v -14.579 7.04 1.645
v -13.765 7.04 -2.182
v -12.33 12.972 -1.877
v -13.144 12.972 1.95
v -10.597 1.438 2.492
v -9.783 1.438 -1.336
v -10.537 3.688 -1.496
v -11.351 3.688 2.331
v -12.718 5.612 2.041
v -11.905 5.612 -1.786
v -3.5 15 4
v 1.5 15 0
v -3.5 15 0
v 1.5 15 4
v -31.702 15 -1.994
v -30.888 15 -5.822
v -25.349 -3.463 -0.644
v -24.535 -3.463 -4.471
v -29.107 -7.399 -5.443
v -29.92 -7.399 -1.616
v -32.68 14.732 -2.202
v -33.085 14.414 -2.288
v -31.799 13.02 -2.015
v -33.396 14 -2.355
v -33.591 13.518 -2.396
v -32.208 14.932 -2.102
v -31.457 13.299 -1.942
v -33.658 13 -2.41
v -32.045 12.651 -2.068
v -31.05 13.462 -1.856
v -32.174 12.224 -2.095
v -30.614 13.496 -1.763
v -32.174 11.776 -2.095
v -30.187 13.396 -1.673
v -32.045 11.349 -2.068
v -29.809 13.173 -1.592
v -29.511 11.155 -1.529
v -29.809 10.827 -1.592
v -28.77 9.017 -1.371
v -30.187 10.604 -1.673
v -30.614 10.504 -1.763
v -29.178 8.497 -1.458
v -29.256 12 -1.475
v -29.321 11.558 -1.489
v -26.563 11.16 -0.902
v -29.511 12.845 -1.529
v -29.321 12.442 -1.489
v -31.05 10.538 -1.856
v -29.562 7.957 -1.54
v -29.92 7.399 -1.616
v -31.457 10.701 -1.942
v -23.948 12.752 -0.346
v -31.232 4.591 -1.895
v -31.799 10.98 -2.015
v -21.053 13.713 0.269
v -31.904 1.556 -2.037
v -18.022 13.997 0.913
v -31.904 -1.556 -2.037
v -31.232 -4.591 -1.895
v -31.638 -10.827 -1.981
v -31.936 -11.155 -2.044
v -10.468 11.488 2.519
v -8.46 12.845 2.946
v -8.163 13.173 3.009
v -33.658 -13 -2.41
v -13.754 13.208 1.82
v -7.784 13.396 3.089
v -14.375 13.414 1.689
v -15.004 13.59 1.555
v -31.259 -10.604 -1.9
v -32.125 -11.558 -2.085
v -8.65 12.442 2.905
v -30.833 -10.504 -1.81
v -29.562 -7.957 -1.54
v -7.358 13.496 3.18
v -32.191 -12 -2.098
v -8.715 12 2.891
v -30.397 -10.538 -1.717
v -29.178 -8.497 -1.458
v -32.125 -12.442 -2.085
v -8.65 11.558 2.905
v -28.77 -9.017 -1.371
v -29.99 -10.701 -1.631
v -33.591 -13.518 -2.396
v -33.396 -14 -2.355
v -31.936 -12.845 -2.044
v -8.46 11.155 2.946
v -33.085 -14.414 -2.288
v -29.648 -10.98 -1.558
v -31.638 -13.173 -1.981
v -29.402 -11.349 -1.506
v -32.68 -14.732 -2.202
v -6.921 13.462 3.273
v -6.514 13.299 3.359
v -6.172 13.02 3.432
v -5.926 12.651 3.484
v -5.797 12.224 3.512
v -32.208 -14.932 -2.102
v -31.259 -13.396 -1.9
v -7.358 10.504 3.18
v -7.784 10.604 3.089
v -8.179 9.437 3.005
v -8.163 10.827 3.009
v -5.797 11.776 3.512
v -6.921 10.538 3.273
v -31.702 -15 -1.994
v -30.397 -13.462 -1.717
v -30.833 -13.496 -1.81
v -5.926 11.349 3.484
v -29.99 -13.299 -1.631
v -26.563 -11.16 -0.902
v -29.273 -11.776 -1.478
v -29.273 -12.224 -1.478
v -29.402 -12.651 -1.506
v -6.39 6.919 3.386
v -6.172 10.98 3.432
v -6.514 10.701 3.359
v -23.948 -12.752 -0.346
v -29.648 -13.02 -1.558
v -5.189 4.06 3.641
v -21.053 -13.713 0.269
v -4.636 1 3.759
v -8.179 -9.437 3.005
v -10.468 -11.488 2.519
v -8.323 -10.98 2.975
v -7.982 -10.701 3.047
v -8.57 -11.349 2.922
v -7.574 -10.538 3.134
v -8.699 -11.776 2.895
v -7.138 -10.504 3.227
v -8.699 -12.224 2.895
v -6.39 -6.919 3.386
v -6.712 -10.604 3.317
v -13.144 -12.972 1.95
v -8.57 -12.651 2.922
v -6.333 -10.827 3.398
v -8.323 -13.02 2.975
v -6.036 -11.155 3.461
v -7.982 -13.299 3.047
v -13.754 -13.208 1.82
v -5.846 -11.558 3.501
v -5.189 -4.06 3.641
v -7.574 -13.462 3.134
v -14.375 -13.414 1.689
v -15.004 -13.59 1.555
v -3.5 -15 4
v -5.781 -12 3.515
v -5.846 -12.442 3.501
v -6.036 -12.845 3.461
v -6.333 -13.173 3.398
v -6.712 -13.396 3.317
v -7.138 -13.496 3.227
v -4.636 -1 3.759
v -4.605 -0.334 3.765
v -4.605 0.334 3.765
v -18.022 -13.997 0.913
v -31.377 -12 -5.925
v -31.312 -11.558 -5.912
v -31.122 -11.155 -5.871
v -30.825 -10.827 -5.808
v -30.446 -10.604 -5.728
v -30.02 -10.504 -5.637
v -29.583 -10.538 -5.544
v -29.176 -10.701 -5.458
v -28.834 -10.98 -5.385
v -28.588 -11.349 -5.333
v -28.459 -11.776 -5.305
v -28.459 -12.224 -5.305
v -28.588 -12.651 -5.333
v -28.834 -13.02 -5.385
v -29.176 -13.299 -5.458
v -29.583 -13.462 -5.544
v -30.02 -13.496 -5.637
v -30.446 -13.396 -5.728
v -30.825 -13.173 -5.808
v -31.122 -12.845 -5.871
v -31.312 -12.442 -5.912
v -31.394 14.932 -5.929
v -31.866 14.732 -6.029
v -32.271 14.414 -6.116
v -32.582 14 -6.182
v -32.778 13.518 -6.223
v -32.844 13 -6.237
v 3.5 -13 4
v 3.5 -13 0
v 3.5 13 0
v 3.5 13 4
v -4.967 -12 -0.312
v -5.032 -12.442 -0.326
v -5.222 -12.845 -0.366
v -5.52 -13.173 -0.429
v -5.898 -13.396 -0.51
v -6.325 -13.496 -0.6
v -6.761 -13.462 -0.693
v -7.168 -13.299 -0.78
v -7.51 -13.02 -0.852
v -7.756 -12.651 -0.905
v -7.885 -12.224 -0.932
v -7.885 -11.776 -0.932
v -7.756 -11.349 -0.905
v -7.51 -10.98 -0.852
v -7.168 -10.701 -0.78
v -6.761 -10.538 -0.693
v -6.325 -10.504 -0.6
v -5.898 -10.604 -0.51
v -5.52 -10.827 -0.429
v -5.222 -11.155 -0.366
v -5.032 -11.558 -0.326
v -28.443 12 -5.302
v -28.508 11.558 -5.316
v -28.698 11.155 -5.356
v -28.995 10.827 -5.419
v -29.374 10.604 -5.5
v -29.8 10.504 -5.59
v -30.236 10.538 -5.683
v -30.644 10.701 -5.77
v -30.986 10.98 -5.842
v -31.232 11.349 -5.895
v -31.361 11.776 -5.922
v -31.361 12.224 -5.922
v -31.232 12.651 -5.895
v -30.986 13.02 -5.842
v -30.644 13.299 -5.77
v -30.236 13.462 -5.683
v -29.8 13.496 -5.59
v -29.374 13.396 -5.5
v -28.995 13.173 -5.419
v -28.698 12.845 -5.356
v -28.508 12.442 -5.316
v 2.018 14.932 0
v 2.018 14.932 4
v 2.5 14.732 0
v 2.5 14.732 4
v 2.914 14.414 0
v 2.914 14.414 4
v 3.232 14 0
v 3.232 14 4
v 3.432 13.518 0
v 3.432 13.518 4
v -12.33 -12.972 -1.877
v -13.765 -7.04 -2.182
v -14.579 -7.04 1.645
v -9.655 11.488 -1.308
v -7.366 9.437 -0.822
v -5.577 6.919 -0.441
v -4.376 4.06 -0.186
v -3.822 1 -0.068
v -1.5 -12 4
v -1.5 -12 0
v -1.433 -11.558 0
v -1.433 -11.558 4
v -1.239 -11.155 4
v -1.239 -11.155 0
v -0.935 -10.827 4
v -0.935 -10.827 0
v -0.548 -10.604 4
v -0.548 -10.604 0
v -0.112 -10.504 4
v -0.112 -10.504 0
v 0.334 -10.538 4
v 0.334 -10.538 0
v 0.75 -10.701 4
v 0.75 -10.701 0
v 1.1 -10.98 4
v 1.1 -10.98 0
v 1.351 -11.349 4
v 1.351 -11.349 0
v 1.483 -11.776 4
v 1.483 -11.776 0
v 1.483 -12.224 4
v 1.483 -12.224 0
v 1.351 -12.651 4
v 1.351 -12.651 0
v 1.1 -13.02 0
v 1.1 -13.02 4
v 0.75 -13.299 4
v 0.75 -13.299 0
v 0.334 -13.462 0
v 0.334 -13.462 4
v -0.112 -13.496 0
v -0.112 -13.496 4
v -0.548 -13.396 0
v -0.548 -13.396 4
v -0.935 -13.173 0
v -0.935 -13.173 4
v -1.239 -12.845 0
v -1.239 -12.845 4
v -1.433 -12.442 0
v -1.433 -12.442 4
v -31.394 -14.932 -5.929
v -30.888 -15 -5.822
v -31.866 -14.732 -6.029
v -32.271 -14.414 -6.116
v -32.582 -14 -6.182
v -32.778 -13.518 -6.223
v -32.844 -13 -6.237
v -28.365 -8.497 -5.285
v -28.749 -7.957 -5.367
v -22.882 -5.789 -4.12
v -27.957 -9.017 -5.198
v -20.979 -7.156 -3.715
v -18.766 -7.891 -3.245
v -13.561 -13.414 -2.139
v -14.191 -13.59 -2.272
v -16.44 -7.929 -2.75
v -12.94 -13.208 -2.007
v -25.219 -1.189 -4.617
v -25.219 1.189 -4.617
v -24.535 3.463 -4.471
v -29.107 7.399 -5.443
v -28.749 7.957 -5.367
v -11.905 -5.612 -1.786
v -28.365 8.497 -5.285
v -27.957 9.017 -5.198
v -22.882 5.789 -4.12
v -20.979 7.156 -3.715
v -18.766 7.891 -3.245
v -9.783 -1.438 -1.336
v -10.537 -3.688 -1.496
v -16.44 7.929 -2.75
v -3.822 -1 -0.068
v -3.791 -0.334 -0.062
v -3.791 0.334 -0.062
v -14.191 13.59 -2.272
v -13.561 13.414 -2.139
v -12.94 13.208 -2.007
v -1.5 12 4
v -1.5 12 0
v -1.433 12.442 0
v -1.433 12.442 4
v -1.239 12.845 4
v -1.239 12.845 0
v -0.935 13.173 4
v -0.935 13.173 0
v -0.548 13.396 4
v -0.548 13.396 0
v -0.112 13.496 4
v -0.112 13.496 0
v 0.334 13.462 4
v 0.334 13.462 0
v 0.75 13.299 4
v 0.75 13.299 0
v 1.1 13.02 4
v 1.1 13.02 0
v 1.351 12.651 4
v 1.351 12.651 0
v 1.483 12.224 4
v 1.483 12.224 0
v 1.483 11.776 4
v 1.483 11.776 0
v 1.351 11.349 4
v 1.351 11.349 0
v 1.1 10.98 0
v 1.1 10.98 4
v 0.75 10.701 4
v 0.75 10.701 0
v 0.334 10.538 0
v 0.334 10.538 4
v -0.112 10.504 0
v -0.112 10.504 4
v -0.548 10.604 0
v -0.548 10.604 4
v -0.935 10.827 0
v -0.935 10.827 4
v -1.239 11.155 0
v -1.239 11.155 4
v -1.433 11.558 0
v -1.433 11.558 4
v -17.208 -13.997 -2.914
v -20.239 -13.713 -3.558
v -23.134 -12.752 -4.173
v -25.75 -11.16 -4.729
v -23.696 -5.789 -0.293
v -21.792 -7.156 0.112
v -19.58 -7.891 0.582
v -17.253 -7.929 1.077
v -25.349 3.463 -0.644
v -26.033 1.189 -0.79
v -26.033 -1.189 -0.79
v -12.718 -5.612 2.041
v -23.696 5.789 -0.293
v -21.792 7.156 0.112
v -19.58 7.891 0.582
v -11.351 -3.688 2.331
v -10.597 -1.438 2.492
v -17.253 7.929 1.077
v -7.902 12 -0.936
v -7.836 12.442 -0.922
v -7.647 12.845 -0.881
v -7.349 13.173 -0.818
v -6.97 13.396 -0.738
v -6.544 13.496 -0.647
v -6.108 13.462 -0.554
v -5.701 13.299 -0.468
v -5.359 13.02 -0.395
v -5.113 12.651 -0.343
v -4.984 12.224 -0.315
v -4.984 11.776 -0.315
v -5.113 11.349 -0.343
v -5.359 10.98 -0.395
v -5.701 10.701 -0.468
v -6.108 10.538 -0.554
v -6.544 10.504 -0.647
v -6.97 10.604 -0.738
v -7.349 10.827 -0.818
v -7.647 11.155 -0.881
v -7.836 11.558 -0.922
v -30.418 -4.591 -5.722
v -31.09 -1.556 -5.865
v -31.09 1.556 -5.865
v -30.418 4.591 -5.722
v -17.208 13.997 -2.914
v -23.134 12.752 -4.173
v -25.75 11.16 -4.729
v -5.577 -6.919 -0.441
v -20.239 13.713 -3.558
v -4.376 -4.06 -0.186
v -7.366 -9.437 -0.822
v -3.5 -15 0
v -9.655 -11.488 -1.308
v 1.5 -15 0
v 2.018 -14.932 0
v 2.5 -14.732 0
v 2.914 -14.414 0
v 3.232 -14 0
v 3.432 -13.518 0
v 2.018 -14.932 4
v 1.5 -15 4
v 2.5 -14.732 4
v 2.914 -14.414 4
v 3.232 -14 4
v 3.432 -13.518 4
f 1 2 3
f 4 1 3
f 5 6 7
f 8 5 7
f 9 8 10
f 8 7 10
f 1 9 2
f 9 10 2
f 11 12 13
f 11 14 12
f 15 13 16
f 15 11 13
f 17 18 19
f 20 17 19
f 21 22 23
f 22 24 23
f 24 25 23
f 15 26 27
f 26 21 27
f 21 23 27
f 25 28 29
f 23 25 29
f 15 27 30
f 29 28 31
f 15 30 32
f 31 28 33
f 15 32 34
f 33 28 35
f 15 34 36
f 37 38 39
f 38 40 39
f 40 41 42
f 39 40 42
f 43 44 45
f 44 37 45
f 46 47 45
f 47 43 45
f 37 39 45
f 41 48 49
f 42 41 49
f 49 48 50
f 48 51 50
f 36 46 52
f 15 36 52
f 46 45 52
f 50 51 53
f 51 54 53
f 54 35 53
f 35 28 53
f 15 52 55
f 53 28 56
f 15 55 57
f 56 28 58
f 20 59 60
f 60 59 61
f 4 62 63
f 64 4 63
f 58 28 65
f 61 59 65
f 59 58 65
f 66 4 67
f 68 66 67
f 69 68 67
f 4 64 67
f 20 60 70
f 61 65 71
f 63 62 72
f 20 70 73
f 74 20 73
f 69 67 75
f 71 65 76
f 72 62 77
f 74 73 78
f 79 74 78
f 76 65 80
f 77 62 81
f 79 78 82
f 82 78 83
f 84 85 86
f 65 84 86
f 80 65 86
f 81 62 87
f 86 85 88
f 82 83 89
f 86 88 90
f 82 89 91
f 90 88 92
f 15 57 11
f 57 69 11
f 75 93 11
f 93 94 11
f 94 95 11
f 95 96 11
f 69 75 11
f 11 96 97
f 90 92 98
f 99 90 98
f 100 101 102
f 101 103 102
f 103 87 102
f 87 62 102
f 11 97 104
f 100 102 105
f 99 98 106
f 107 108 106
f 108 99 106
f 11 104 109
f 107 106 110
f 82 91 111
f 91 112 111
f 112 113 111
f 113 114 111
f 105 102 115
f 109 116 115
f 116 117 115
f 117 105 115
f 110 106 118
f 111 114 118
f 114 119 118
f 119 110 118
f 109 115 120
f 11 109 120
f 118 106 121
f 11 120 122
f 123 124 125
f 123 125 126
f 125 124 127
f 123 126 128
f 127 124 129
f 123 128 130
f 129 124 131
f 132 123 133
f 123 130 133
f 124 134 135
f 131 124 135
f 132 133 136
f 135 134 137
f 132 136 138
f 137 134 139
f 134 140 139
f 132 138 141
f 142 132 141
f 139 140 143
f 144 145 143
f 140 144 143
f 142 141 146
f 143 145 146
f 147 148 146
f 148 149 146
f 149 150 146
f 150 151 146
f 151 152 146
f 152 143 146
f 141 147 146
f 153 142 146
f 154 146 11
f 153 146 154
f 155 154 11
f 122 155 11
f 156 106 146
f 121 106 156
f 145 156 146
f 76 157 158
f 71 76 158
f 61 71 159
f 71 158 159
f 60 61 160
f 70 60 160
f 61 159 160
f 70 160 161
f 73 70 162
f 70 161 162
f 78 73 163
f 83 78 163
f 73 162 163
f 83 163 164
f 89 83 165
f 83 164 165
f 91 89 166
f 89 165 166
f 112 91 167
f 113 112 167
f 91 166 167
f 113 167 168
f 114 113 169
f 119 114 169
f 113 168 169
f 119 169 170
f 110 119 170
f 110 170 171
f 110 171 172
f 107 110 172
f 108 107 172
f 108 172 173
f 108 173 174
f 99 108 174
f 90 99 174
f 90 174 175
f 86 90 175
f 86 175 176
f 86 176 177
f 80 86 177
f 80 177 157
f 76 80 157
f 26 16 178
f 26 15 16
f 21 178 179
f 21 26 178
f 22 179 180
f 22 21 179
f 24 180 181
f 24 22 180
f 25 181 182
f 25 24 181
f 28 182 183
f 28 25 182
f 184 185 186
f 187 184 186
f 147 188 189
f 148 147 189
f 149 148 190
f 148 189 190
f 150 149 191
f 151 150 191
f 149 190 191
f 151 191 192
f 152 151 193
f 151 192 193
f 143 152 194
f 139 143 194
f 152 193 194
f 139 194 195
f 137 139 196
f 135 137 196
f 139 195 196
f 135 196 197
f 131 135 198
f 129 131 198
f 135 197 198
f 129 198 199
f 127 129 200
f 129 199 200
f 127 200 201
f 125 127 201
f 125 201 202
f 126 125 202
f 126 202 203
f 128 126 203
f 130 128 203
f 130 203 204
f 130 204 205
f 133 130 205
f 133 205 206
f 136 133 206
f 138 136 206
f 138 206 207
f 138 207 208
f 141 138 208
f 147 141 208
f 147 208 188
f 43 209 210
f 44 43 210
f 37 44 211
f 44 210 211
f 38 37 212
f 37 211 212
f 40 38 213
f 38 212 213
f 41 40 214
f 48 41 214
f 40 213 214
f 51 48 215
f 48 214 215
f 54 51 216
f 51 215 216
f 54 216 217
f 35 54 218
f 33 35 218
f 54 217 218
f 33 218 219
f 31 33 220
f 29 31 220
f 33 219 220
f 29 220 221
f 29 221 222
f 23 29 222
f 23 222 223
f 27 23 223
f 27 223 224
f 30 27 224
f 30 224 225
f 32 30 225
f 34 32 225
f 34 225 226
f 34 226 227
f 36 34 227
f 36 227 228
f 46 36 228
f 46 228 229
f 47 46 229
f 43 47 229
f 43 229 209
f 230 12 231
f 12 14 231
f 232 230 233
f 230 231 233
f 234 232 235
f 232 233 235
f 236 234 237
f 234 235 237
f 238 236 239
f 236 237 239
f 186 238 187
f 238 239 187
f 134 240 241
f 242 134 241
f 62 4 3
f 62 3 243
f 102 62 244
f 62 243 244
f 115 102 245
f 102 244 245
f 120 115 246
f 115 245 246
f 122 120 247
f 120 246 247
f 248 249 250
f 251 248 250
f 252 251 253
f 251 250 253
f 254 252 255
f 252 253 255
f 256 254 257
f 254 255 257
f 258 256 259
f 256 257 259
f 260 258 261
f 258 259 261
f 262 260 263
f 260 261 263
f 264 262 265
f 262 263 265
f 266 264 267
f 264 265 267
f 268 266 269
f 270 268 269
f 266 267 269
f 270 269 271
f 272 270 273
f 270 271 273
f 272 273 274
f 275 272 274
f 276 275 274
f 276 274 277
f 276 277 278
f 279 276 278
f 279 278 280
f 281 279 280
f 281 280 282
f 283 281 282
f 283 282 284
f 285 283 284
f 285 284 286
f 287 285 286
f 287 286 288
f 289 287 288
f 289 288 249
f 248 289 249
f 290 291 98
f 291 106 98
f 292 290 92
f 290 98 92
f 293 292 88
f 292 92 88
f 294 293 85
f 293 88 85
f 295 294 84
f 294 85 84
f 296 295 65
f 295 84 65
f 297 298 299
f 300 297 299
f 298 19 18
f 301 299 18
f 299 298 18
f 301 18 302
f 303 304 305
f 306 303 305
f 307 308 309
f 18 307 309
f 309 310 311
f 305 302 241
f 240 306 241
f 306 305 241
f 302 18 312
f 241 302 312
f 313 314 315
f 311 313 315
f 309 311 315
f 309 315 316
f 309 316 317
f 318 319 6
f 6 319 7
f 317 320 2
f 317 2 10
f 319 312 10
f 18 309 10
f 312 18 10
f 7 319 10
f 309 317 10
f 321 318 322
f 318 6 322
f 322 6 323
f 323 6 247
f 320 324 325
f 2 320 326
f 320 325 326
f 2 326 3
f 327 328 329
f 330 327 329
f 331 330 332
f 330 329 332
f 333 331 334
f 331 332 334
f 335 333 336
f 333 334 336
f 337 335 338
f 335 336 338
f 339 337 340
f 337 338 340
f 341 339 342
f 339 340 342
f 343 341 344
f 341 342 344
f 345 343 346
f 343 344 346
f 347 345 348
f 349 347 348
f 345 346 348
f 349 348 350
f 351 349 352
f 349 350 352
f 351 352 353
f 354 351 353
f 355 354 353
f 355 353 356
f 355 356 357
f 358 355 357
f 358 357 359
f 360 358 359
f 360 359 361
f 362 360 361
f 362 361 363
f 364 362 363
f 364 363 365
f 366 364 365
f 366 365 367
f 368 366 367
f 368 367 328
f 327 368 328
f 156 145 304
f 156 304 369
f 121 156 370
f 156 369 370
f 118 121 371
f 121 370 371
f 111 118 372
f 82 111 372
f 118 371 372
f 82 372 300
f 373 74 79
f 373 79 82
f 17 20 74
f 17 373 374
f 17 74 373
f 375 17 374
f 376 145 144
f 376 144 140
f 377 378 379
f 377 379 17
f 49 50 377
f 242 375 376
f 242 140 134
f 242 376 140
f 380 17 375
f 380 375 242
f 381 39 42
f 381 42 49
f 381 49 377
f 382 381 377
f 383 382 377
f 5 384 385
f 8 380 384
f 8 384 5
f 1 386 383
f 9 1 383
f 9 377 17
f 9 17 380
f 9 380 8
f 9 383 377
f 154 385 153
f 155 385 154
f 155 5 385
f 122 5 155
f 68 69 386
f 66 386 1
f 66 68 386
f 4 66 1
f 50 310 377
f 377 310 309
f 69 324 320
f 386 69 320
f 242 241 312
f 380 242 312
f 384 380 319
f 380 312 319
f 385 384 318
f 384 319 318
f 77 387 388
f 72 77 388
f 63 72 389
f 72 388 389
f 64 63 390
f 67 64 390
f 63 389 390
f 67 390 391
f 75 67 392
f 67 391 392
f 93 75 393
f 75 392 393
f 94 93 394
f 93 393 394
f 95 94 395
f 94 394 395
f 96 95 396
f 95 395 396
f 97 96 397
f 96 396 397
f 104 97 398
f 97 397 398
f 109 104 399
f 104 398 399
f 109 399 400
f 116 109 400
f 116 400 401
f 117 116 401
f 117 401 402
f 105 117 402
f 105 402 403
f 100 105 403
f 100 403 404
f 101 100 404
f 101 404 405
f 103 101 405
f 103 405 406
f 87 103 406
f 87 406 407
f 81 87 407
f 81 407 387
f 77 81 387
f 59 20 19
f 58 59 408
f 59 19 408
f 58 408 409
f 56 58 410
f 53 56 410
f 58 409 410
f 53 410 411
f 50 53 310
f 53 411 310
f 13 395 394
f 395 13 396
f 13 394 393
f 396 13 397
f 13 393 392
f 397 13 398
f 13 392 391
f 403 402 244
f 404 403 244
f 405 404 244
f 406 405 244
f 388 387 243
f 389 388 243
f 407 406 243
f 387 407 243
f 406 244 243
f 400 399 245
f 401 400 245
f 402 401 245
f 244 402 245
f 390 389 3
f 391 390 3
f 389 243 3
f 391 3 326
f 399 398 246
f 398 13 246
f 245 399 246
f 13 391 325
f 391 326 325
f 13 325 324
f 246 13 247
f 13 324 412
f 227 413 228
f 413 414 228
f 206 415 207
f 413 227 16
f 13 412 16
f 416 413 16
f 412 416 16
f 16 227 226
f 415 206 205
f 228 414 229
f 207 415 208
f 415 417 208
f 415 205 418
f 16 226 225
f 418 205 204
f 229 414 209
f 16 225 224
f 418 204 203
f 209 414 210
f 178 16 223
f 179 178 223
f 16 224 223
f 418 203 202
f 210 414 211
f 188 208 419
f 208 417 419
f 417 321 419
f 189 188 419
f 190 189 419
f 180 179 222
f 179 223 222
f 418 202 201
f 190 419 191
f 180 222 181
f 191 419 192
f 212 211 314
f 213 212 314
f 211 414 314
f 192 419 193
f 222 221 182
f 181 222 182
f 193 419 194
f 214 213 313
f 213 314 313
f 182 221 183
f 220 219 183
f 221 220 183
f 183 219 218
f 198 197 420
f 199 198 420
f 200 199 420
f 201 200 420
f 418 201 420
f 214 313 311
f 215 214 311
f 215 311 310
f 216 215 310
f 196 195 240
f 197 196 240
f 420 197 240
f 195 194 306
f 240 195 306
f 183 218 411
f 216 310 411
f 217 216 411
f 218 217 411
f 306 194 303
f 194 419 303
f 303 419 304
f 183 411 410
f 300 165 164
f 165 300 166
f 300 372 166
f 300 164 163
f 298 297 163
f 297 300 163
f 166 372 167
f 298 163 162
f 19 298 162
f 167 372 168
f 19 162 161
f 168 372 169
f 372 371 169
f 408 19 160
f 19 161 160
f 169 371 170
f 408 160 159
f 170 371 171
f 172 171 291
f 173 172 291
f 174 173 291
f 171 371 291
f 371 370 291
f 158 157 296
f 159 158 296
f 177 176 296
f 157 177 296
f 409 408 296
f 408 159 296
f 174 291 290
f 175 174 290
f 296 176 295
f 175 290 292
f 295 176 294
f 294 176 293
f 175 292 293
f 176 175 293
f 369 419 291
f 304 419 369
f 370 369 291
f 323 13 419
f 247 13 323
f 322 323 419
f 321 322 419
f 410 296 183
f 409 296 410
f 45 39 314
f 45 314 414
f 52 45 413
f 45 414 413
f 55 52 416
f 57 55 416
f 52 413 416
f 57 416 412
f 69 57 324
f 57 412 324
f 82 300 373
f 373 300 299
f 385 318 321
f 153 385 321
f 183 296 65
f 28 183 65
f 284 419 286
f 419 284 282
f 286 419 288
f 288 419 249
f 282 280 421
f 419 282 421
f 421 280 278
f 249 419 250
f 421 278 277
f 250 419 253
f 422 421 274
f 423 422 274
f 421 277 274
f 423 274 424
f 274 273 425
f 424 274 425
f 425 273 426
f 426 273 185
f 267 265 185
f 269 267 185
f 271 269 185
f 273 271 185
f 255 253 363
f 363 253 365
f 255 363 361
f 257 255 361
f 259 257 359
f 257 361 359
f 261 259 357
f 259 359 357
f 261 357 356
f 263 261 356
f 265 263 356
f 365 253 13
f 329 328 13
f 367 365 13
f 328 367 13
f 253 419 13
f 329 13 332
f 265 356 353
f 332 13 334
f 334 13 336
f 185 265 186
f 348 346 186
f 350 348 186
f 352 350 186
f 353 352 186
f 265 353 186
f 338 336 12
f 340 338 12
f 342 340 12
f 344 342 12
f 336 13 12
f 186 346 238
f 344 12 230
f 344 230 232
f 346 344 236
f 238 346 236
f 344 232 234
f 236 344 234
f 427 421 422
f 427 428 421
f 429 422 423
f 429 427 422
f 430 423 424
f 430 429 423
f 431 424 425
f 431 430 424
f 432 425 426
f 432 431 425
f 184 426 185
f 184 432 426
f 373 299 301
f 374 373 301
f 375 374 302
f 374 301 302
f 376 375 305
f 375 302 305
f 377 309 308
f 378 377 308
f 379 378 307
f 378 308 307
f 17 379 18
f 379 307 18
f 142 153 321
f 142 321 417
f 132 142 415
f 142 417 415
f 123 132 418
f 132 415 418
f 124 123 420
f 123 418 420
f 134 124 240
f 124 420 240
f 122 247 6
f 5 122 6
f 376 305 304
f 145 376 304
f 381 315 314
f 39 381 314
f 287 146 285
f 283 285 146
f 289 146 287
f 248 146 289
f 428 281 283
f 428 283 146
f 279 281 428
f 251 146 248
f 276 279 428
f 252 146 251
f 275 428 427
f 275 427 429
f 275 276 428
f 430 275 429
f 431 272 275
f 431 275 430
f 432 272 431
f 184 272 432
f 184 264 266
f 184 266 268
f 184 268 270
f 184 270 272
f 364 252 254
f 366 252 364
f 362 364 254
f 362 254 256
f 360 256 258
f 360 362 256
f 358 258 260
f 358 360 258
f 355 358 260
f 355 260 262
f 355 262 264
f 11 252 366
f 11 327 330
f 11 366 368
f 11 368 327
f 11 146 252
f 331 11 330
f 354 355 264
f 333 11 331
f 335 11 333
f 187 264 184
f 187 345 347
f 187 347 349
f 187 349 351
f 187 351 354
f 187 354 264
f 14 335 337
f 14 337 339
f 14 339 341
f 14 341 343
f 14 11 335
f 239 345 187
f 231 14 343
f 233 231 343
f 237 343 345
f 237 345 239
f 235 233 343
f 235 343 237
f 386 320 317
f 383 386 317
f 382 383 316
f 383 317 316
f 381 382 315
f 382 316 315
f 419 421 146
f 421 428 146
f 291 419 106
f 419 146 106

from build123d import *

# Parameters (mm, degrees)
SKETCH_1_W          = 7
SKETCH_1_H          = 30
EXTRUDE_1_DEPTH     = 4
EXTRUDE_2_DEPTH     = 30
SKETCH_3_R          = 1.5
CUT_EXTRUDE_2_DEPTH = 38.373237277
SKETCH_4_R          = 1.5
CUT_EXTRUDE_3_DEPTH = 38.362858307
SKETCH_5_R          = 14
CUT_EXTRUDE_4_DEPTH = 38.362858307
FILLET_1_R          = 2
FILLET_2_R          = 2
EXTRUDE_START       = -3.912590403
EXTRUDE_4_DEPTH     = 3.912590403


with BuildPart() as part:
    # 草圖1 → 填料-伸長1 (new body)
    with BuildSketch(Plane.XY):
        Rectangle(SKETCH_1_W, SKETCH_1_H)
    extrude(amount=EXTRUDE_1_DEPTH)

    # 草圖2 → 填料-伸長2 (add)
    with BuildSketch(Plane.XZ.offset(15)):
        Polygon((-3.5, 0), (-32.844428022, -6.237350725), (-33.657901308, -2.410259809), (-3.5, 4), align=None)
    extrude(amount=-EXTRUDE_2_DEPTH)

    # 草圖3 → 除料-伸長2 (cut, through all)
    with BuildSketch(Plane(origin=(0, 0, 0), x_dir=(-1, 0, 0), z_dir=(0, 0, -1))):
        with Locations((0, -12)):
            Circle(SKETCH_3_R)
        with Locations((0, 12)):
            Circle(SKETCH_3_R)
    extrude(amount=-CUT_EXTRUDE_2_DEPTH, mode=Mode.SUBTRACT)

    # 草圖4 → 除料-伸長3 (cut, through all)
    with BuildSketch(Plane(origin=(-0.151295449, 0, 0.711789125), x_dir=(-0.978147600733807, 0, -0.2079116908177533), z_dir=(0.2079116908177533, 0, -0.978147600733807))):
        with Locations((30.423516603, -12)):
            Circle(SKETCH_4_R)
        with Locations(Location((30.423516603, 12, 0), (0, 0, 180))):
            Circle(SKETCH_4_R)
        with Locations((6.423516603, 12)):
            Circle(SKETCH_4_R)
        with Locations(Location((6.423516603, -12, 0), (0, 0, 180))):
            Circle(SKETCH_4_R)
    extrude(amount=-CUT_EXTRUDE_3_DEPTH, mode=Mode.SUBTRACT)

    # 草圖5 → 除料-伸長4 (cut, through all)
    with BuildSketch(Plane(origin=(-0.151295449, 0, 0.711789125), x_dir=(-0.978147600733807, 0, -0.2079116908177533), z_dir=(0.2079116908177533, 0, -0.978147600733807))):
        with Locations((17.717091252, 0)):
            Circle(SKETCH_5_R)
    extrude(amount=-CUT_EXTRUDE_4_DEPTH, mode=Mode.SUBTRACT)

    # 圓角1
    fillet_1_edges = [part.edges().sort_by_distance(p)[0] for p in [
        (-33.251164665, -15, -4.323805267),
        (-33.251164665, 15, -4.323805267),
    ]]
    fillet(fillet_1_edges, radius=FILLET_1_R)

    # 圓角2
    fillet_2_edges = [part.edges().sort_by_distance(p)[0] for p in [
        (3.5, 15, 2),
        (3.5, -15, 2),
    ]]
    fillet(fillet_2_edges, radius=FILLET_2_R)

    # 草圖7 → 填料-伸長4 (add)
    with BuildSketch(Plane(origin=(-0.964768735, 0, 4.538880041), x_dir=(0.978147600733807, 0, 0.20791169081775324), z_dir=(-0.20791169081775324, 0, 0.978147600733807)).offset(EXTRUDE_START)):
        with BuildLine():
            Line((-3.752851208, 1), (-9.847302899, 1.43750871))
            ThreePointArc((-9.847302899, 1.43750871), (-11.244955297, 4.702282018), (-13.918040883, 7.040398873))
            Line((-13.918040883, 7.040398873), (-12.450847248, 12.971764494))
            ThreePointArc((-12.450847248, 12.971764494), (-13.39085333, 13.314791228), (-14.352960281, 13.589798483))
            Line((-14.352960281, 13.589798483), (-16.652344934, 7.928828115))
            ThreePointArc((-16.652344934, 7.928828115), (-20.189227207, 7.60845213), (-23.238937351, 5.788714508))
            Line((-23.238937351, 5.788714508), (-28.426613508, 9.016991352))
            ThreePointArc((-28.426613508, 9.016991352), (-29.043329173, 8.228993532), (-29.602184013, 7.398957363))
            Line((-29.602184013, 7.398957363), (-24.92883019, 3.462776556))
            ThreePointArc((-24.92883019, 3.462776556), (-25.717091252, 0), (-24.92883019, -3.462776556))
            Line((-24.92883019, -3.462776556), (-29.602184013, -7.398957363))
            ThreePointArc((-29.602184013, -7.398957363), (-29.043329173, -8.228993532), (-28.426613508, -9.016991352))
            Line((-28.426613508, -9.016991352), (-23.238937351, -5.788714508))
            ThreePointArc((-23.238937351, -5.788714508), (-20.189227207, -7.60845213), (-16.652344934, -7.928828115))
            Line((-16.652344934, -7.928828115), (-14.352960281, -13.589798483))
            ThreePointArc((-14.352960281, -13.589798483), (-13.39085333, -13.314791228), (-12.450847248, -12.971764494))
            Line((-12.450847248, -12.971764494), (-13.918040883, -7.040398873))
            ThreePointArc((-13.918040883, -7.040398873), (-11.244955297, -4.702282018), (-9.847302899, -1.43750871))
            Line((-9.847302899, -1.43750871), (-3.752851208, -1))
            ThreePointArc((-3.752851208, -1), (-3.717091252, 0), (-3.752851208, 1))
        make_face()
    extrude(amount=EXTRUDE_4_DEPTH)


solid = part.part
